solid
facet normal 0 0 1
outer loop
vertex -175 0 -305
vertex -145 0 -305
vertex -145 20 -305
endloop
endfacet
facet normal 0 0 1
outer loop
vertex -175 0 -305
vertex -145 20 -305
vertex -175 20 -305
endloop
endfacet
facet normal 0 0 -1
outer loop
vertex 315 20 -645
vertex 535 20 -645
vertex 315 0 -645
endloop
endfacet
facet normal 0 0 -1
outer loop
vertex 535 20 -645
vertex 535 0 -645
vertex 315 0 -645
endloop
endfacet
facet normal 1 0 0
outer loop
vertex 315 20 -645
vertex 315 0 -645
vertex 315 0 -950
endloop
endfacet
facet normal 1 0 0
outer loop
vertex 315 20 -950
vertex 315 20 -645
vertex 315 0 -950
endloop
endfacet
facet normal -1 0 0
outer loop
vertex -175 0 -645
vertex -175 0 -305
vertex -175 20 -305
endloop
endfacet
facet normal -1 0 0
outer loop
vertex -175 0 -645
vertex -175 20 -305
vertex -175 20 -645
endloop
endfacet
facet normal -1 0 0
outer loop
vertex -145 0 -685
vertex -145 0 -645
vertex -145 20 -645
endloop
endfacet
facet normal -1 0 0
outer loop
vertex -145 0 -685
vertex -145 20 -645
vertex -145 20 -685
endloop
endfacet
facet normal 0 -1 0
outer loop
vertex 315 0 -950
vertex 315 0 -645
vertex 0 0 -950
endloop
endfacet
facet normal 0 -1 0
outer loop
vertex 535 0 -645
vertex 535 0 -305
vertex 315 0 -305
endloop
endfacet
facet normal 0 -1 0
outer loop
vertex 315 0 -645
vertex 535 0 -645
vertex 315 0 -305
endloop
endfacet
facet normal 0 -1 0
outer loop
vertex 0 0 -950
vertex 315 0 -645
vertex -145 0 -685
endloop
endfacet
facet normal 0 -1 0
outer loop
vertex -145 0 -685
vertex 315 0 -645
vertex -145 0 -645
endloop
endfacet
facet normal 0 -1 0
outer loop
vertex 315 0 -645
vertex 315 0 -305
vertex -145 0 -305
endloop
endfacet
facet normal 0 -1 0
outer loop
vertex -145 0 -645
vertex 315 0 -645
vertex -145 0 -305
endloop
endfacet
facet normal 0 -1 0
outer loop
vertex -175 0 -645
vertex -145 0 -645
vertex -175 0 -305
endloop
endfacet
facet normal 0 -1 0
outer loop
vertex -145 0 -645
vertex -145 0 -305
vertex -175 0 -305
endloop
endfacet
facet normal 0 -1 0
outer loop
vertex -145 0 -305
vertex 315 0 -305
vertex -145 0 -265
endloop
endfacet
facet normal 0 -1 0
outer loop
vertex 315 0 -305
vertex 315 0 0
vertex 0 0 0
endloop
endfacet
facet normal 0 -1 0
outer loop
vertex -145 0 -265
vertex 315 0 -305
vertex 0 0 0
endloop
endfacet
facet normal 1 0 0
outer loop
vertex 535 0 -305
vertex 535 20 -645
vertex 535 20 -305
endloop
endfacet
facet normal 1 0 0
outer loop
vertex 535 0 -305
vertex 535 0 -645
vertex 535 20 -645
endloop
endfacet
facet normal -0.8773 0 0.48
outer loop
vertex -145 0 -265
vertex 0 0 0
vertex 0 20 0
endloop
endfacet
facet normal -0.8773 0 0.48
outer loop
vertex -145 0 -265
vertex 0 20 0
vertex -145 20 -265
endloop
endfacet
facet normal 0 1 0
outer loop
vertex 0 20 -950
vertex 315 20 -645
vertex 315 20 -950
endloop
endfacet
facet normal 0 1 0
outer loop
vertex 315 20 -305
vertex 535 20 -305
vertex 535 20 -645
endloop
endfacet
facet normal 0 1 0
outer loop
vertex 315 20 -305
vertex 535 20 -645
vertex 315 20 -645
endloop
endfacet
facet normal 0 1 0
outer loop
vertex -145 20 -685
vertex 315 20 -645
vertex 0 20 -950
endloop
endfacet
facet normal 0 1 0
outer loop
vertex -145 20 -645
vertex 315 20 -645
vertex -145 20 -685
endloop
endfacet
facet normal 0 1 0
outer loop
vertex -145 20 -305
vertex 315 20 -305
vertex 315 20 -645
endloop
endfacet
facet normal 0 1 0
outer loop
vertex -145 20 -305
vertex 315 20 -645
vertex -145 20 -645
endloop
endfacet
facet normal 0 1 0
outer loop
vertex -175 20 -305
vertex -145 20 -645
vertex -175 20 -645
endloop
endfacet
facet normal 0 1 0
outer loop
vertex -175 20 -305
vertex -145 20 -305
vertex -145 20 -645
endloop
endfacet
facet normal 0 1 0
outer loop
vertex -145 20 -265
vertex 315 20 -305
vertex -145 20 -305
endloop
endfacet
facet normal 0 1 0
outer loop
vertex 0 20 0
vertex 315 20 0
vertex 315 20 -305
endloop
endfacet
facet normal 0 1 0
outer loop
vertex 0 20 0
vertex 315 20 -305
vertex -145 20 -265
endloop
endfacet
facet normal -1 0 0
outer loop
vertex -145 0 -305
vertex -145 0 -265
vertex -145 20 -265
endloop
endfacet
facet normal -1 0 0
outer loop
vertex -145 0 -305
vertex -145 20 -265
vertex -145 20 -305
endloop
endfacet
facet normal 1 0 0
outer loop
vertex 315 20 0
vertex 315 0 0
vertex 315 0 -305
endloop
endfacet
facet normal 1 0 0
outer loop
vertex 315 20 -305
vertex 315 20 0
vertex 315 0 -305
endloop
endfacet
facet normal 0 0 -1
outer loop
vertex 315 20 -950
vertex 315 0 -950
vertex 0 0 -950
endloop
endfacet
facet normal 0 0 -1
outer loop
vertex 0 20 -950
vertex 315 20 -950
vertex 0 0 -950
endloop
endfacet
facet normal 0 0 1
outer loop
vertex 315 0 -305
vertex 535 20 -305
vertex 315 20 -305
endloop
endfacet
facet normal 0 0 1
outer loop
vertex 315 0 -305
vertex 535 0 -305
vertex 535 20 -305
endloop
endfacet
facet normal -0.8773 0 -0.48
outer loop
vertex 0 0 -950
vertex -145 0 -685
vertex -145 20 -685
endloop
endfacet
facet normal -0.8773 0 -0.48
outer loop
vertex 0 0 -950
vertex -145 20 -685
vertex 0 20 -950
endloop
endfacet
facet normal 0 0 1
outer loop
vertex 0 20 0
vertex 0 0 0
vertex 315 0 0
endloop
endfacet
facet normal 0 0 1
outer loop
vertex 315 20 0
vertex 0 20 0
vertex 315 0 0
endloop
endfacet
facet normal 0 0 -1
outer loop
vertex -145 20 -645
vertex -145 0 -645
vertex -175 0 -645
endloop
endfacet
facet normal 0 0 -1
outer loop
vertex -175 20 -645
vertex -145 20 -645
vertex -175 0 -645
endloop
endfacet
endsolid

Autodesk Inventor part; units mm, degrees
ref_plane "YZ Plane" through (0, 0, 0) normal (1, 0, 0) x (0, 1, 0)
ref_plane "XZ Plane" through (0, 0, 0) normal (0, 1, 0) x (-1, 0, 0)
ref_plane "XY Plane" through (0, 0, 0) normal (0, 0, 1) x (1, 0, 0)
sketch "스케치1" plane through (0, 0, 0) normal (0, 1, 0) x (-1, 0, 0)
  line L0 (0, 0) -> (-315, 0)
  line L1 (-315, 0) -> (-315, -950)
  line L2 (-315, -950) -> (0, -950)
  line L3 (0, -950) -> (0, 0)
  line L4 (-315, -645) -> (-315, -475)
  line L5 (-315, -475) -> (-535, -475)
  line L6 (-535, -475) -> (-535, -645)
  line L7 (-535, -645) -> (-315, -645)
  line L8 (-315, -645) -> (-315, -475)
  line L9 (-315, -475) -> (-535, -475)
  line L10 (-315, -305) -> (-315, -475)
  line L11 (-315, -475) -> (-535, -475)
  line L12 (-535, -475) -> (-535, -305)
  line L13 (-535, -305) -> (-315, -305)
  line L14 (-315, -305) -> (-315, -475)
  line L15 (0, -305) -> (0, 0)
  line L16 (0, -645) -> (0, -950)
  line L17 (0, 0) -> (175, 0)
  line L18 (175, 0) -> (175, -950)
  line L19 (175, -950) -> (0, -950)
  line L20 (0, -950) -> (0, 0)
  line L21 (175, 0) -> (145, 0)
  line L22 (145, 0) -> (145, -950)
  line L23 (145, -950) -> (175, -950)
  line L24 (175, -950) -> (175, 0)
  line L25 (175, -475) -> (145, -475)
  line L26 (145, -475) -> (145, -645)
  line L27 (145, -645) -> (175, -645)
  line L28 (175, -645) -> (175, -475)
  line L29 (175, -475) -> (145, -475)
  line L30 (145, -475) -> (145, -305)
  line L31 (145, -305) -> (175, -305)
  line L32 (175, -305) -> (175, -475)
  line L33 (145, -645) -> (-315, -645)
  line L34 (-315, -645) -> (-315, -685)
  line L35 (-315, -685) -> (145, -685)
  line L36 (145, -685) -> (145, -645)
  line L37 (145, -305) -> (-315, -305)
  line L38 (-315, -305) -> (-315, -265)
  line L39 (-315, -265) -> (145, -265)
  line L40 (145, -265) -> (145, -305)
  line L41 (0, 0) -> (145, -265)
  line L42 (145, -685) -> (0, -950)
  dimension "d0" = 315
  dimension "d1" = 950
  dimension "d3" = 220
  dimension "d4" = 170
  dimension "d5" = 220
  dimension "d6" = 170
  dimension "d7" = 175
  dimension "d8" = 30
  dimension "d9" = 460
  dimension "d10" = 40
  dimension "d11" = 460
  dimension "d12" = 40
extrude "돌출1" add sketch "스케치1" along normal blind 20 contours L3 L39 L1 L0 | L41 L39 L3 | L39 L22 L37 L3 | L3 L37 L1 L39 | L37 L22 L33 L3 | L3 L33 L1 L37 | L31 L18 L25 L22 | L1 L5 L12 L13 | L33 L22 L35 L3 | L3 L35 L1 L33 | L25 L18 L27 L22 | L1 L7 L6 L5 | L35 L42 L3 | L3 L2 L1 L35
properties part number "cover" material "청동, 주조"
